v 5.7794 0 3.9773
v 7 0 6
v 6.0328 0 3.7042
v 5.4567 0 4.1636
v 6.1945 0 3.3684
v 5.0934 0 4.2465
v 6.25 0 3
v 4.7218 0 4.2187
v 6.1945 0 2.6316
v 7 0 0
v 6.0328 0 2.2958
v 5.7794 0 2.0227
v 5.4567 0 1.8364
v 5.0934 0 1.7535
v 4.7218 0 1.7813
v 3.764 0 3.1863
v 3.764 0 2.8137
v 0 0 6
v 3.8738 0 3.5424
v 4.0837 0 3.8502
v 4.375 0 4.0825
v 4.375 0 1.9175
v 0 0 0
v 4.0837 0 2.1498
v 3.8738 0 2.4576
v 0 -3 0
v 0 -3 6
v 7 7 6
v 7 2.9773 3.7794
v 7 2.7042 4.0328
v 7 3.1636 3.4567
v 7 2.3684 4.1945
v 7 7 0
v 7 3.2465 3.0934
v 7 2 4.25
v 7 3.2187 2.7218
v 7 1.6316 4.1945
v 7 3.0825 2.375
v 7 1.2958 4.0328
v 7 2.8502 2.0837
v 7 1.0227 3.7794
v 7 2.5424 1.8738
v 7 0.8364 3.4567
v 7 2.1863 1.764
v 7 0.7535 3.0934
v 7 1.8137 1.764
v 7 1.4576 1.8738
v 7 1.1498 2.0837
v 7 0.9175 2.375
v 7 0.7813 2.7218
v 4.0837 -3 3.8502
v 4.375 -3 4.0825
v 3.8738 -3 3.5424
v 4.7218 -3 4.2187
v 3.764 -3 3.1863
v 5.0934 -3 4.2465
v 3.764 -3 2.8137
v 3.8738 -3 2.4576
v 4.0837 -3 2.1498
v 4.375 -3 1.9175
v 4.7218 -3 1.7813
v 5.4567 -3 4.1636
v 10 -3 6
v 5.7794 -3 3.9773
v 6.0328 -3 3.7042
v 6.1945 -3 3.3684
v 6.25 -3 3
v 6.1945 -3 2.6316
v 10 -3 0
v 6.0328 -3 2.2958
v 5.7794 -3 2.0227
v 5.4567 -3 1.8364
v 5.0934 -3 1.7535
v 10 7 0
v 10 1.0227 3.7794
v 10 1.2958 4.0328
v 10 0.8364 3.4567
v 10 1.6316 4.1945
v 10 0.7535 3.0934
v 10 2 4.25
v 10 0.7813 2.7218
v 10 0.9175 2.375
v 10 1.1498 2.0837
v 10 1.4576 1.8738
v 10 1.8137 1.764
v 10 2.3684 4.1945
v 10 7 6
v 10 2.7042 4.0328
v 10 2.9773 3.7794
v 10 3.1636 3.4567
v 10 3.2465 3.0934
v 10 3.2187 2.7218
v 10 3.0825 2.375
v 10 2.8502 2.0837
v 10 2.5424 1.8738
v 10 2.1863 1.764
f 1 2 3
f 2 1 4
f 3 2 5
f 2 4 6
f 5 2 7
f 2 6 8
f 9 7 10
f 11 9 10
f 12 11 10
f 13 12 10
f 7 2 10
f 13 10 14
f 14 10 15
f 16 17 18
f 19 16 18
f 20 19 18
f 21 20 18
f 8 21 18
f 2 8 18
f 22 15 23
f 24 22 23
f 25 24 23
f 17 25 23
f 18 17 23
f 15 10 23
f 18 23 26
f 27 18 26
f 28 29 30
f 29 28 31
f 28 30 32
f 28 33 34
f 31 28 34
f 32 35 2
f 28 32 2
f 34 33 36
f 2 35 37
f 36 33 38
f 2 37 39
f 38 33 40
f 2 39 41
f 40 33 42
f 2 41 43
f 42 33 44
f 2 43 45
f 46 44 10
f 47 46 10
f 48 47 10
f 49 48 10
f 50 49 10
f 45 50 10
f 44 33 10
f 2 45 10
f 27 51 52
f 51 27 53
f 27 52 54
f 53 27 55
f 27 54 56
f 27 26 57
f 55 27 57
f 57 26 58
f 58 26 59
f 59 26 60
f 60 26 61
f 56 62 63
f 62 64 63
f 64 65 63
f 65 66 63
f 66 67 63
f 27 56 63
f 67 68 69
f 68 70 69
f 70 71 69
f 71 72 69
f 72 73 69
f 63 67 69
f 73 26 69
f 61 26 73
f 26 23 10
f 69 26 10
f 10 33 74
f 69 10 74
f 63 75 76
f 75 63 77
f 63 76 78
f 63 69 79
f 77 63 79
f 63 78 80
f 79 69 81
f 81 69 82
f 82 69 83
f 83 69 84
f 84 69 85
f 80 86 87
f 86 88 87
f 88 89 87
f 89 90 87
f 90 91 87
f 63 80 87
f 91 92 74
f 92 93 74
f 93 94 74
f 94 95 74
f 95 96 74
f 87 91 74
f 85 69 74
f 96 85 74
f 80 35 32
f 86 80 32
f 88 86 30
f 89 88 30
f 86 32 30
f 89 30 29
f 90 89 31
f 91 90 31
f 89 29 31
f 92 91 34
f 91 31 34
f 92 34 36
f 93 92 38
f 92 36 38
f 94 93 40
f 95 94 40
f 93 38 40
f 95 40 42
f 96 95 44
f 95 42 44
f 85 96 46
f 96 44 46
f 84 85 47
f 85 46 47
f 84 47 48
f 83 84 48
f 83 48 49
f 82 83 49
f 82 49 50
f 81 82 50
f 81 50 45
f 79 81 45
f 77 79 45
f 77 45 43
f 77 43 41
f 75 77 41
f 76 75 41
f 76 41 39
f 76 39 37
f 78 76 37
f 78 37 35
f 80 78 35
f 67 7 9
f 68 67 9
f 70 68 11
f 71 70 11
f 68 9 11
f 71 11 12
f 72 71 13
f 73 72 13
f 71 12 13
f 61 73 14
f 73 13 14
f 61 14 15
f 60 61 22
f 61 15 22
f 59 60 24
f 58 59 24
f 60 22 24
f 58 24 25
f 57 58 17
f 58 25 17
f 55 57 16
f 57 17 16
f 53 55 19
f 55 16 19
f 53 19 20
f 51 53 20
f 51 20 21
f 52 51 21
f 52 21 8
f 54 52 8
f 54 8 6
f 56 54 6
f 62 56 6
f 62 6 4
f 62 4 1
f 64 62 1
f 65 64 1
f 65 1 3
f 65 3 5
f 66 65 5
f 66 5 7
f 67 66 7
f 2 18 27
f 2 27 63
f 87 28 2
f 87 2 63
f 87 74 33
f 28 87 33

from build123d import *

# Parameters (mm, degrees)
EXTRUDE_1_DEPTH    = 6
HOLE_WIZARD_M3_1_D = 2.5
HOLE_WIZARD_M3_2_D = 2.5


with BuildPart() as part:
    # 草图1 → 凸台-拉伸1 (new body)
    with BuildSketch(Plane.XY):
        Polygon((0, 0), (0, -3), (10, -3), (10, 7), (7, 7), (7, 0), align=None)
    extrude(amount=EXTRUDE_1_DEPTH)

    # M3 螺纹孔1 (through all)
    with Locations(Plane(origin=(0, -3, 0), x_dir=(-1, 0, 0), z_dir=(0, -1, 0))):
        with Locations((-5, -3)):
            Hole(HOLE_WIZARD_M3_1_D / 2)

    # M3 螺纹孔2 (through all)
    with Locations(Plane(origin=(10, 0, 0), x_dir=(0, 0, -1), z_dir=(1, 0, 0))):
        with Locations((-3, 2)):
            Hole(HOLE_WIZARD_M3_2_D / 2)


solid = part.part
